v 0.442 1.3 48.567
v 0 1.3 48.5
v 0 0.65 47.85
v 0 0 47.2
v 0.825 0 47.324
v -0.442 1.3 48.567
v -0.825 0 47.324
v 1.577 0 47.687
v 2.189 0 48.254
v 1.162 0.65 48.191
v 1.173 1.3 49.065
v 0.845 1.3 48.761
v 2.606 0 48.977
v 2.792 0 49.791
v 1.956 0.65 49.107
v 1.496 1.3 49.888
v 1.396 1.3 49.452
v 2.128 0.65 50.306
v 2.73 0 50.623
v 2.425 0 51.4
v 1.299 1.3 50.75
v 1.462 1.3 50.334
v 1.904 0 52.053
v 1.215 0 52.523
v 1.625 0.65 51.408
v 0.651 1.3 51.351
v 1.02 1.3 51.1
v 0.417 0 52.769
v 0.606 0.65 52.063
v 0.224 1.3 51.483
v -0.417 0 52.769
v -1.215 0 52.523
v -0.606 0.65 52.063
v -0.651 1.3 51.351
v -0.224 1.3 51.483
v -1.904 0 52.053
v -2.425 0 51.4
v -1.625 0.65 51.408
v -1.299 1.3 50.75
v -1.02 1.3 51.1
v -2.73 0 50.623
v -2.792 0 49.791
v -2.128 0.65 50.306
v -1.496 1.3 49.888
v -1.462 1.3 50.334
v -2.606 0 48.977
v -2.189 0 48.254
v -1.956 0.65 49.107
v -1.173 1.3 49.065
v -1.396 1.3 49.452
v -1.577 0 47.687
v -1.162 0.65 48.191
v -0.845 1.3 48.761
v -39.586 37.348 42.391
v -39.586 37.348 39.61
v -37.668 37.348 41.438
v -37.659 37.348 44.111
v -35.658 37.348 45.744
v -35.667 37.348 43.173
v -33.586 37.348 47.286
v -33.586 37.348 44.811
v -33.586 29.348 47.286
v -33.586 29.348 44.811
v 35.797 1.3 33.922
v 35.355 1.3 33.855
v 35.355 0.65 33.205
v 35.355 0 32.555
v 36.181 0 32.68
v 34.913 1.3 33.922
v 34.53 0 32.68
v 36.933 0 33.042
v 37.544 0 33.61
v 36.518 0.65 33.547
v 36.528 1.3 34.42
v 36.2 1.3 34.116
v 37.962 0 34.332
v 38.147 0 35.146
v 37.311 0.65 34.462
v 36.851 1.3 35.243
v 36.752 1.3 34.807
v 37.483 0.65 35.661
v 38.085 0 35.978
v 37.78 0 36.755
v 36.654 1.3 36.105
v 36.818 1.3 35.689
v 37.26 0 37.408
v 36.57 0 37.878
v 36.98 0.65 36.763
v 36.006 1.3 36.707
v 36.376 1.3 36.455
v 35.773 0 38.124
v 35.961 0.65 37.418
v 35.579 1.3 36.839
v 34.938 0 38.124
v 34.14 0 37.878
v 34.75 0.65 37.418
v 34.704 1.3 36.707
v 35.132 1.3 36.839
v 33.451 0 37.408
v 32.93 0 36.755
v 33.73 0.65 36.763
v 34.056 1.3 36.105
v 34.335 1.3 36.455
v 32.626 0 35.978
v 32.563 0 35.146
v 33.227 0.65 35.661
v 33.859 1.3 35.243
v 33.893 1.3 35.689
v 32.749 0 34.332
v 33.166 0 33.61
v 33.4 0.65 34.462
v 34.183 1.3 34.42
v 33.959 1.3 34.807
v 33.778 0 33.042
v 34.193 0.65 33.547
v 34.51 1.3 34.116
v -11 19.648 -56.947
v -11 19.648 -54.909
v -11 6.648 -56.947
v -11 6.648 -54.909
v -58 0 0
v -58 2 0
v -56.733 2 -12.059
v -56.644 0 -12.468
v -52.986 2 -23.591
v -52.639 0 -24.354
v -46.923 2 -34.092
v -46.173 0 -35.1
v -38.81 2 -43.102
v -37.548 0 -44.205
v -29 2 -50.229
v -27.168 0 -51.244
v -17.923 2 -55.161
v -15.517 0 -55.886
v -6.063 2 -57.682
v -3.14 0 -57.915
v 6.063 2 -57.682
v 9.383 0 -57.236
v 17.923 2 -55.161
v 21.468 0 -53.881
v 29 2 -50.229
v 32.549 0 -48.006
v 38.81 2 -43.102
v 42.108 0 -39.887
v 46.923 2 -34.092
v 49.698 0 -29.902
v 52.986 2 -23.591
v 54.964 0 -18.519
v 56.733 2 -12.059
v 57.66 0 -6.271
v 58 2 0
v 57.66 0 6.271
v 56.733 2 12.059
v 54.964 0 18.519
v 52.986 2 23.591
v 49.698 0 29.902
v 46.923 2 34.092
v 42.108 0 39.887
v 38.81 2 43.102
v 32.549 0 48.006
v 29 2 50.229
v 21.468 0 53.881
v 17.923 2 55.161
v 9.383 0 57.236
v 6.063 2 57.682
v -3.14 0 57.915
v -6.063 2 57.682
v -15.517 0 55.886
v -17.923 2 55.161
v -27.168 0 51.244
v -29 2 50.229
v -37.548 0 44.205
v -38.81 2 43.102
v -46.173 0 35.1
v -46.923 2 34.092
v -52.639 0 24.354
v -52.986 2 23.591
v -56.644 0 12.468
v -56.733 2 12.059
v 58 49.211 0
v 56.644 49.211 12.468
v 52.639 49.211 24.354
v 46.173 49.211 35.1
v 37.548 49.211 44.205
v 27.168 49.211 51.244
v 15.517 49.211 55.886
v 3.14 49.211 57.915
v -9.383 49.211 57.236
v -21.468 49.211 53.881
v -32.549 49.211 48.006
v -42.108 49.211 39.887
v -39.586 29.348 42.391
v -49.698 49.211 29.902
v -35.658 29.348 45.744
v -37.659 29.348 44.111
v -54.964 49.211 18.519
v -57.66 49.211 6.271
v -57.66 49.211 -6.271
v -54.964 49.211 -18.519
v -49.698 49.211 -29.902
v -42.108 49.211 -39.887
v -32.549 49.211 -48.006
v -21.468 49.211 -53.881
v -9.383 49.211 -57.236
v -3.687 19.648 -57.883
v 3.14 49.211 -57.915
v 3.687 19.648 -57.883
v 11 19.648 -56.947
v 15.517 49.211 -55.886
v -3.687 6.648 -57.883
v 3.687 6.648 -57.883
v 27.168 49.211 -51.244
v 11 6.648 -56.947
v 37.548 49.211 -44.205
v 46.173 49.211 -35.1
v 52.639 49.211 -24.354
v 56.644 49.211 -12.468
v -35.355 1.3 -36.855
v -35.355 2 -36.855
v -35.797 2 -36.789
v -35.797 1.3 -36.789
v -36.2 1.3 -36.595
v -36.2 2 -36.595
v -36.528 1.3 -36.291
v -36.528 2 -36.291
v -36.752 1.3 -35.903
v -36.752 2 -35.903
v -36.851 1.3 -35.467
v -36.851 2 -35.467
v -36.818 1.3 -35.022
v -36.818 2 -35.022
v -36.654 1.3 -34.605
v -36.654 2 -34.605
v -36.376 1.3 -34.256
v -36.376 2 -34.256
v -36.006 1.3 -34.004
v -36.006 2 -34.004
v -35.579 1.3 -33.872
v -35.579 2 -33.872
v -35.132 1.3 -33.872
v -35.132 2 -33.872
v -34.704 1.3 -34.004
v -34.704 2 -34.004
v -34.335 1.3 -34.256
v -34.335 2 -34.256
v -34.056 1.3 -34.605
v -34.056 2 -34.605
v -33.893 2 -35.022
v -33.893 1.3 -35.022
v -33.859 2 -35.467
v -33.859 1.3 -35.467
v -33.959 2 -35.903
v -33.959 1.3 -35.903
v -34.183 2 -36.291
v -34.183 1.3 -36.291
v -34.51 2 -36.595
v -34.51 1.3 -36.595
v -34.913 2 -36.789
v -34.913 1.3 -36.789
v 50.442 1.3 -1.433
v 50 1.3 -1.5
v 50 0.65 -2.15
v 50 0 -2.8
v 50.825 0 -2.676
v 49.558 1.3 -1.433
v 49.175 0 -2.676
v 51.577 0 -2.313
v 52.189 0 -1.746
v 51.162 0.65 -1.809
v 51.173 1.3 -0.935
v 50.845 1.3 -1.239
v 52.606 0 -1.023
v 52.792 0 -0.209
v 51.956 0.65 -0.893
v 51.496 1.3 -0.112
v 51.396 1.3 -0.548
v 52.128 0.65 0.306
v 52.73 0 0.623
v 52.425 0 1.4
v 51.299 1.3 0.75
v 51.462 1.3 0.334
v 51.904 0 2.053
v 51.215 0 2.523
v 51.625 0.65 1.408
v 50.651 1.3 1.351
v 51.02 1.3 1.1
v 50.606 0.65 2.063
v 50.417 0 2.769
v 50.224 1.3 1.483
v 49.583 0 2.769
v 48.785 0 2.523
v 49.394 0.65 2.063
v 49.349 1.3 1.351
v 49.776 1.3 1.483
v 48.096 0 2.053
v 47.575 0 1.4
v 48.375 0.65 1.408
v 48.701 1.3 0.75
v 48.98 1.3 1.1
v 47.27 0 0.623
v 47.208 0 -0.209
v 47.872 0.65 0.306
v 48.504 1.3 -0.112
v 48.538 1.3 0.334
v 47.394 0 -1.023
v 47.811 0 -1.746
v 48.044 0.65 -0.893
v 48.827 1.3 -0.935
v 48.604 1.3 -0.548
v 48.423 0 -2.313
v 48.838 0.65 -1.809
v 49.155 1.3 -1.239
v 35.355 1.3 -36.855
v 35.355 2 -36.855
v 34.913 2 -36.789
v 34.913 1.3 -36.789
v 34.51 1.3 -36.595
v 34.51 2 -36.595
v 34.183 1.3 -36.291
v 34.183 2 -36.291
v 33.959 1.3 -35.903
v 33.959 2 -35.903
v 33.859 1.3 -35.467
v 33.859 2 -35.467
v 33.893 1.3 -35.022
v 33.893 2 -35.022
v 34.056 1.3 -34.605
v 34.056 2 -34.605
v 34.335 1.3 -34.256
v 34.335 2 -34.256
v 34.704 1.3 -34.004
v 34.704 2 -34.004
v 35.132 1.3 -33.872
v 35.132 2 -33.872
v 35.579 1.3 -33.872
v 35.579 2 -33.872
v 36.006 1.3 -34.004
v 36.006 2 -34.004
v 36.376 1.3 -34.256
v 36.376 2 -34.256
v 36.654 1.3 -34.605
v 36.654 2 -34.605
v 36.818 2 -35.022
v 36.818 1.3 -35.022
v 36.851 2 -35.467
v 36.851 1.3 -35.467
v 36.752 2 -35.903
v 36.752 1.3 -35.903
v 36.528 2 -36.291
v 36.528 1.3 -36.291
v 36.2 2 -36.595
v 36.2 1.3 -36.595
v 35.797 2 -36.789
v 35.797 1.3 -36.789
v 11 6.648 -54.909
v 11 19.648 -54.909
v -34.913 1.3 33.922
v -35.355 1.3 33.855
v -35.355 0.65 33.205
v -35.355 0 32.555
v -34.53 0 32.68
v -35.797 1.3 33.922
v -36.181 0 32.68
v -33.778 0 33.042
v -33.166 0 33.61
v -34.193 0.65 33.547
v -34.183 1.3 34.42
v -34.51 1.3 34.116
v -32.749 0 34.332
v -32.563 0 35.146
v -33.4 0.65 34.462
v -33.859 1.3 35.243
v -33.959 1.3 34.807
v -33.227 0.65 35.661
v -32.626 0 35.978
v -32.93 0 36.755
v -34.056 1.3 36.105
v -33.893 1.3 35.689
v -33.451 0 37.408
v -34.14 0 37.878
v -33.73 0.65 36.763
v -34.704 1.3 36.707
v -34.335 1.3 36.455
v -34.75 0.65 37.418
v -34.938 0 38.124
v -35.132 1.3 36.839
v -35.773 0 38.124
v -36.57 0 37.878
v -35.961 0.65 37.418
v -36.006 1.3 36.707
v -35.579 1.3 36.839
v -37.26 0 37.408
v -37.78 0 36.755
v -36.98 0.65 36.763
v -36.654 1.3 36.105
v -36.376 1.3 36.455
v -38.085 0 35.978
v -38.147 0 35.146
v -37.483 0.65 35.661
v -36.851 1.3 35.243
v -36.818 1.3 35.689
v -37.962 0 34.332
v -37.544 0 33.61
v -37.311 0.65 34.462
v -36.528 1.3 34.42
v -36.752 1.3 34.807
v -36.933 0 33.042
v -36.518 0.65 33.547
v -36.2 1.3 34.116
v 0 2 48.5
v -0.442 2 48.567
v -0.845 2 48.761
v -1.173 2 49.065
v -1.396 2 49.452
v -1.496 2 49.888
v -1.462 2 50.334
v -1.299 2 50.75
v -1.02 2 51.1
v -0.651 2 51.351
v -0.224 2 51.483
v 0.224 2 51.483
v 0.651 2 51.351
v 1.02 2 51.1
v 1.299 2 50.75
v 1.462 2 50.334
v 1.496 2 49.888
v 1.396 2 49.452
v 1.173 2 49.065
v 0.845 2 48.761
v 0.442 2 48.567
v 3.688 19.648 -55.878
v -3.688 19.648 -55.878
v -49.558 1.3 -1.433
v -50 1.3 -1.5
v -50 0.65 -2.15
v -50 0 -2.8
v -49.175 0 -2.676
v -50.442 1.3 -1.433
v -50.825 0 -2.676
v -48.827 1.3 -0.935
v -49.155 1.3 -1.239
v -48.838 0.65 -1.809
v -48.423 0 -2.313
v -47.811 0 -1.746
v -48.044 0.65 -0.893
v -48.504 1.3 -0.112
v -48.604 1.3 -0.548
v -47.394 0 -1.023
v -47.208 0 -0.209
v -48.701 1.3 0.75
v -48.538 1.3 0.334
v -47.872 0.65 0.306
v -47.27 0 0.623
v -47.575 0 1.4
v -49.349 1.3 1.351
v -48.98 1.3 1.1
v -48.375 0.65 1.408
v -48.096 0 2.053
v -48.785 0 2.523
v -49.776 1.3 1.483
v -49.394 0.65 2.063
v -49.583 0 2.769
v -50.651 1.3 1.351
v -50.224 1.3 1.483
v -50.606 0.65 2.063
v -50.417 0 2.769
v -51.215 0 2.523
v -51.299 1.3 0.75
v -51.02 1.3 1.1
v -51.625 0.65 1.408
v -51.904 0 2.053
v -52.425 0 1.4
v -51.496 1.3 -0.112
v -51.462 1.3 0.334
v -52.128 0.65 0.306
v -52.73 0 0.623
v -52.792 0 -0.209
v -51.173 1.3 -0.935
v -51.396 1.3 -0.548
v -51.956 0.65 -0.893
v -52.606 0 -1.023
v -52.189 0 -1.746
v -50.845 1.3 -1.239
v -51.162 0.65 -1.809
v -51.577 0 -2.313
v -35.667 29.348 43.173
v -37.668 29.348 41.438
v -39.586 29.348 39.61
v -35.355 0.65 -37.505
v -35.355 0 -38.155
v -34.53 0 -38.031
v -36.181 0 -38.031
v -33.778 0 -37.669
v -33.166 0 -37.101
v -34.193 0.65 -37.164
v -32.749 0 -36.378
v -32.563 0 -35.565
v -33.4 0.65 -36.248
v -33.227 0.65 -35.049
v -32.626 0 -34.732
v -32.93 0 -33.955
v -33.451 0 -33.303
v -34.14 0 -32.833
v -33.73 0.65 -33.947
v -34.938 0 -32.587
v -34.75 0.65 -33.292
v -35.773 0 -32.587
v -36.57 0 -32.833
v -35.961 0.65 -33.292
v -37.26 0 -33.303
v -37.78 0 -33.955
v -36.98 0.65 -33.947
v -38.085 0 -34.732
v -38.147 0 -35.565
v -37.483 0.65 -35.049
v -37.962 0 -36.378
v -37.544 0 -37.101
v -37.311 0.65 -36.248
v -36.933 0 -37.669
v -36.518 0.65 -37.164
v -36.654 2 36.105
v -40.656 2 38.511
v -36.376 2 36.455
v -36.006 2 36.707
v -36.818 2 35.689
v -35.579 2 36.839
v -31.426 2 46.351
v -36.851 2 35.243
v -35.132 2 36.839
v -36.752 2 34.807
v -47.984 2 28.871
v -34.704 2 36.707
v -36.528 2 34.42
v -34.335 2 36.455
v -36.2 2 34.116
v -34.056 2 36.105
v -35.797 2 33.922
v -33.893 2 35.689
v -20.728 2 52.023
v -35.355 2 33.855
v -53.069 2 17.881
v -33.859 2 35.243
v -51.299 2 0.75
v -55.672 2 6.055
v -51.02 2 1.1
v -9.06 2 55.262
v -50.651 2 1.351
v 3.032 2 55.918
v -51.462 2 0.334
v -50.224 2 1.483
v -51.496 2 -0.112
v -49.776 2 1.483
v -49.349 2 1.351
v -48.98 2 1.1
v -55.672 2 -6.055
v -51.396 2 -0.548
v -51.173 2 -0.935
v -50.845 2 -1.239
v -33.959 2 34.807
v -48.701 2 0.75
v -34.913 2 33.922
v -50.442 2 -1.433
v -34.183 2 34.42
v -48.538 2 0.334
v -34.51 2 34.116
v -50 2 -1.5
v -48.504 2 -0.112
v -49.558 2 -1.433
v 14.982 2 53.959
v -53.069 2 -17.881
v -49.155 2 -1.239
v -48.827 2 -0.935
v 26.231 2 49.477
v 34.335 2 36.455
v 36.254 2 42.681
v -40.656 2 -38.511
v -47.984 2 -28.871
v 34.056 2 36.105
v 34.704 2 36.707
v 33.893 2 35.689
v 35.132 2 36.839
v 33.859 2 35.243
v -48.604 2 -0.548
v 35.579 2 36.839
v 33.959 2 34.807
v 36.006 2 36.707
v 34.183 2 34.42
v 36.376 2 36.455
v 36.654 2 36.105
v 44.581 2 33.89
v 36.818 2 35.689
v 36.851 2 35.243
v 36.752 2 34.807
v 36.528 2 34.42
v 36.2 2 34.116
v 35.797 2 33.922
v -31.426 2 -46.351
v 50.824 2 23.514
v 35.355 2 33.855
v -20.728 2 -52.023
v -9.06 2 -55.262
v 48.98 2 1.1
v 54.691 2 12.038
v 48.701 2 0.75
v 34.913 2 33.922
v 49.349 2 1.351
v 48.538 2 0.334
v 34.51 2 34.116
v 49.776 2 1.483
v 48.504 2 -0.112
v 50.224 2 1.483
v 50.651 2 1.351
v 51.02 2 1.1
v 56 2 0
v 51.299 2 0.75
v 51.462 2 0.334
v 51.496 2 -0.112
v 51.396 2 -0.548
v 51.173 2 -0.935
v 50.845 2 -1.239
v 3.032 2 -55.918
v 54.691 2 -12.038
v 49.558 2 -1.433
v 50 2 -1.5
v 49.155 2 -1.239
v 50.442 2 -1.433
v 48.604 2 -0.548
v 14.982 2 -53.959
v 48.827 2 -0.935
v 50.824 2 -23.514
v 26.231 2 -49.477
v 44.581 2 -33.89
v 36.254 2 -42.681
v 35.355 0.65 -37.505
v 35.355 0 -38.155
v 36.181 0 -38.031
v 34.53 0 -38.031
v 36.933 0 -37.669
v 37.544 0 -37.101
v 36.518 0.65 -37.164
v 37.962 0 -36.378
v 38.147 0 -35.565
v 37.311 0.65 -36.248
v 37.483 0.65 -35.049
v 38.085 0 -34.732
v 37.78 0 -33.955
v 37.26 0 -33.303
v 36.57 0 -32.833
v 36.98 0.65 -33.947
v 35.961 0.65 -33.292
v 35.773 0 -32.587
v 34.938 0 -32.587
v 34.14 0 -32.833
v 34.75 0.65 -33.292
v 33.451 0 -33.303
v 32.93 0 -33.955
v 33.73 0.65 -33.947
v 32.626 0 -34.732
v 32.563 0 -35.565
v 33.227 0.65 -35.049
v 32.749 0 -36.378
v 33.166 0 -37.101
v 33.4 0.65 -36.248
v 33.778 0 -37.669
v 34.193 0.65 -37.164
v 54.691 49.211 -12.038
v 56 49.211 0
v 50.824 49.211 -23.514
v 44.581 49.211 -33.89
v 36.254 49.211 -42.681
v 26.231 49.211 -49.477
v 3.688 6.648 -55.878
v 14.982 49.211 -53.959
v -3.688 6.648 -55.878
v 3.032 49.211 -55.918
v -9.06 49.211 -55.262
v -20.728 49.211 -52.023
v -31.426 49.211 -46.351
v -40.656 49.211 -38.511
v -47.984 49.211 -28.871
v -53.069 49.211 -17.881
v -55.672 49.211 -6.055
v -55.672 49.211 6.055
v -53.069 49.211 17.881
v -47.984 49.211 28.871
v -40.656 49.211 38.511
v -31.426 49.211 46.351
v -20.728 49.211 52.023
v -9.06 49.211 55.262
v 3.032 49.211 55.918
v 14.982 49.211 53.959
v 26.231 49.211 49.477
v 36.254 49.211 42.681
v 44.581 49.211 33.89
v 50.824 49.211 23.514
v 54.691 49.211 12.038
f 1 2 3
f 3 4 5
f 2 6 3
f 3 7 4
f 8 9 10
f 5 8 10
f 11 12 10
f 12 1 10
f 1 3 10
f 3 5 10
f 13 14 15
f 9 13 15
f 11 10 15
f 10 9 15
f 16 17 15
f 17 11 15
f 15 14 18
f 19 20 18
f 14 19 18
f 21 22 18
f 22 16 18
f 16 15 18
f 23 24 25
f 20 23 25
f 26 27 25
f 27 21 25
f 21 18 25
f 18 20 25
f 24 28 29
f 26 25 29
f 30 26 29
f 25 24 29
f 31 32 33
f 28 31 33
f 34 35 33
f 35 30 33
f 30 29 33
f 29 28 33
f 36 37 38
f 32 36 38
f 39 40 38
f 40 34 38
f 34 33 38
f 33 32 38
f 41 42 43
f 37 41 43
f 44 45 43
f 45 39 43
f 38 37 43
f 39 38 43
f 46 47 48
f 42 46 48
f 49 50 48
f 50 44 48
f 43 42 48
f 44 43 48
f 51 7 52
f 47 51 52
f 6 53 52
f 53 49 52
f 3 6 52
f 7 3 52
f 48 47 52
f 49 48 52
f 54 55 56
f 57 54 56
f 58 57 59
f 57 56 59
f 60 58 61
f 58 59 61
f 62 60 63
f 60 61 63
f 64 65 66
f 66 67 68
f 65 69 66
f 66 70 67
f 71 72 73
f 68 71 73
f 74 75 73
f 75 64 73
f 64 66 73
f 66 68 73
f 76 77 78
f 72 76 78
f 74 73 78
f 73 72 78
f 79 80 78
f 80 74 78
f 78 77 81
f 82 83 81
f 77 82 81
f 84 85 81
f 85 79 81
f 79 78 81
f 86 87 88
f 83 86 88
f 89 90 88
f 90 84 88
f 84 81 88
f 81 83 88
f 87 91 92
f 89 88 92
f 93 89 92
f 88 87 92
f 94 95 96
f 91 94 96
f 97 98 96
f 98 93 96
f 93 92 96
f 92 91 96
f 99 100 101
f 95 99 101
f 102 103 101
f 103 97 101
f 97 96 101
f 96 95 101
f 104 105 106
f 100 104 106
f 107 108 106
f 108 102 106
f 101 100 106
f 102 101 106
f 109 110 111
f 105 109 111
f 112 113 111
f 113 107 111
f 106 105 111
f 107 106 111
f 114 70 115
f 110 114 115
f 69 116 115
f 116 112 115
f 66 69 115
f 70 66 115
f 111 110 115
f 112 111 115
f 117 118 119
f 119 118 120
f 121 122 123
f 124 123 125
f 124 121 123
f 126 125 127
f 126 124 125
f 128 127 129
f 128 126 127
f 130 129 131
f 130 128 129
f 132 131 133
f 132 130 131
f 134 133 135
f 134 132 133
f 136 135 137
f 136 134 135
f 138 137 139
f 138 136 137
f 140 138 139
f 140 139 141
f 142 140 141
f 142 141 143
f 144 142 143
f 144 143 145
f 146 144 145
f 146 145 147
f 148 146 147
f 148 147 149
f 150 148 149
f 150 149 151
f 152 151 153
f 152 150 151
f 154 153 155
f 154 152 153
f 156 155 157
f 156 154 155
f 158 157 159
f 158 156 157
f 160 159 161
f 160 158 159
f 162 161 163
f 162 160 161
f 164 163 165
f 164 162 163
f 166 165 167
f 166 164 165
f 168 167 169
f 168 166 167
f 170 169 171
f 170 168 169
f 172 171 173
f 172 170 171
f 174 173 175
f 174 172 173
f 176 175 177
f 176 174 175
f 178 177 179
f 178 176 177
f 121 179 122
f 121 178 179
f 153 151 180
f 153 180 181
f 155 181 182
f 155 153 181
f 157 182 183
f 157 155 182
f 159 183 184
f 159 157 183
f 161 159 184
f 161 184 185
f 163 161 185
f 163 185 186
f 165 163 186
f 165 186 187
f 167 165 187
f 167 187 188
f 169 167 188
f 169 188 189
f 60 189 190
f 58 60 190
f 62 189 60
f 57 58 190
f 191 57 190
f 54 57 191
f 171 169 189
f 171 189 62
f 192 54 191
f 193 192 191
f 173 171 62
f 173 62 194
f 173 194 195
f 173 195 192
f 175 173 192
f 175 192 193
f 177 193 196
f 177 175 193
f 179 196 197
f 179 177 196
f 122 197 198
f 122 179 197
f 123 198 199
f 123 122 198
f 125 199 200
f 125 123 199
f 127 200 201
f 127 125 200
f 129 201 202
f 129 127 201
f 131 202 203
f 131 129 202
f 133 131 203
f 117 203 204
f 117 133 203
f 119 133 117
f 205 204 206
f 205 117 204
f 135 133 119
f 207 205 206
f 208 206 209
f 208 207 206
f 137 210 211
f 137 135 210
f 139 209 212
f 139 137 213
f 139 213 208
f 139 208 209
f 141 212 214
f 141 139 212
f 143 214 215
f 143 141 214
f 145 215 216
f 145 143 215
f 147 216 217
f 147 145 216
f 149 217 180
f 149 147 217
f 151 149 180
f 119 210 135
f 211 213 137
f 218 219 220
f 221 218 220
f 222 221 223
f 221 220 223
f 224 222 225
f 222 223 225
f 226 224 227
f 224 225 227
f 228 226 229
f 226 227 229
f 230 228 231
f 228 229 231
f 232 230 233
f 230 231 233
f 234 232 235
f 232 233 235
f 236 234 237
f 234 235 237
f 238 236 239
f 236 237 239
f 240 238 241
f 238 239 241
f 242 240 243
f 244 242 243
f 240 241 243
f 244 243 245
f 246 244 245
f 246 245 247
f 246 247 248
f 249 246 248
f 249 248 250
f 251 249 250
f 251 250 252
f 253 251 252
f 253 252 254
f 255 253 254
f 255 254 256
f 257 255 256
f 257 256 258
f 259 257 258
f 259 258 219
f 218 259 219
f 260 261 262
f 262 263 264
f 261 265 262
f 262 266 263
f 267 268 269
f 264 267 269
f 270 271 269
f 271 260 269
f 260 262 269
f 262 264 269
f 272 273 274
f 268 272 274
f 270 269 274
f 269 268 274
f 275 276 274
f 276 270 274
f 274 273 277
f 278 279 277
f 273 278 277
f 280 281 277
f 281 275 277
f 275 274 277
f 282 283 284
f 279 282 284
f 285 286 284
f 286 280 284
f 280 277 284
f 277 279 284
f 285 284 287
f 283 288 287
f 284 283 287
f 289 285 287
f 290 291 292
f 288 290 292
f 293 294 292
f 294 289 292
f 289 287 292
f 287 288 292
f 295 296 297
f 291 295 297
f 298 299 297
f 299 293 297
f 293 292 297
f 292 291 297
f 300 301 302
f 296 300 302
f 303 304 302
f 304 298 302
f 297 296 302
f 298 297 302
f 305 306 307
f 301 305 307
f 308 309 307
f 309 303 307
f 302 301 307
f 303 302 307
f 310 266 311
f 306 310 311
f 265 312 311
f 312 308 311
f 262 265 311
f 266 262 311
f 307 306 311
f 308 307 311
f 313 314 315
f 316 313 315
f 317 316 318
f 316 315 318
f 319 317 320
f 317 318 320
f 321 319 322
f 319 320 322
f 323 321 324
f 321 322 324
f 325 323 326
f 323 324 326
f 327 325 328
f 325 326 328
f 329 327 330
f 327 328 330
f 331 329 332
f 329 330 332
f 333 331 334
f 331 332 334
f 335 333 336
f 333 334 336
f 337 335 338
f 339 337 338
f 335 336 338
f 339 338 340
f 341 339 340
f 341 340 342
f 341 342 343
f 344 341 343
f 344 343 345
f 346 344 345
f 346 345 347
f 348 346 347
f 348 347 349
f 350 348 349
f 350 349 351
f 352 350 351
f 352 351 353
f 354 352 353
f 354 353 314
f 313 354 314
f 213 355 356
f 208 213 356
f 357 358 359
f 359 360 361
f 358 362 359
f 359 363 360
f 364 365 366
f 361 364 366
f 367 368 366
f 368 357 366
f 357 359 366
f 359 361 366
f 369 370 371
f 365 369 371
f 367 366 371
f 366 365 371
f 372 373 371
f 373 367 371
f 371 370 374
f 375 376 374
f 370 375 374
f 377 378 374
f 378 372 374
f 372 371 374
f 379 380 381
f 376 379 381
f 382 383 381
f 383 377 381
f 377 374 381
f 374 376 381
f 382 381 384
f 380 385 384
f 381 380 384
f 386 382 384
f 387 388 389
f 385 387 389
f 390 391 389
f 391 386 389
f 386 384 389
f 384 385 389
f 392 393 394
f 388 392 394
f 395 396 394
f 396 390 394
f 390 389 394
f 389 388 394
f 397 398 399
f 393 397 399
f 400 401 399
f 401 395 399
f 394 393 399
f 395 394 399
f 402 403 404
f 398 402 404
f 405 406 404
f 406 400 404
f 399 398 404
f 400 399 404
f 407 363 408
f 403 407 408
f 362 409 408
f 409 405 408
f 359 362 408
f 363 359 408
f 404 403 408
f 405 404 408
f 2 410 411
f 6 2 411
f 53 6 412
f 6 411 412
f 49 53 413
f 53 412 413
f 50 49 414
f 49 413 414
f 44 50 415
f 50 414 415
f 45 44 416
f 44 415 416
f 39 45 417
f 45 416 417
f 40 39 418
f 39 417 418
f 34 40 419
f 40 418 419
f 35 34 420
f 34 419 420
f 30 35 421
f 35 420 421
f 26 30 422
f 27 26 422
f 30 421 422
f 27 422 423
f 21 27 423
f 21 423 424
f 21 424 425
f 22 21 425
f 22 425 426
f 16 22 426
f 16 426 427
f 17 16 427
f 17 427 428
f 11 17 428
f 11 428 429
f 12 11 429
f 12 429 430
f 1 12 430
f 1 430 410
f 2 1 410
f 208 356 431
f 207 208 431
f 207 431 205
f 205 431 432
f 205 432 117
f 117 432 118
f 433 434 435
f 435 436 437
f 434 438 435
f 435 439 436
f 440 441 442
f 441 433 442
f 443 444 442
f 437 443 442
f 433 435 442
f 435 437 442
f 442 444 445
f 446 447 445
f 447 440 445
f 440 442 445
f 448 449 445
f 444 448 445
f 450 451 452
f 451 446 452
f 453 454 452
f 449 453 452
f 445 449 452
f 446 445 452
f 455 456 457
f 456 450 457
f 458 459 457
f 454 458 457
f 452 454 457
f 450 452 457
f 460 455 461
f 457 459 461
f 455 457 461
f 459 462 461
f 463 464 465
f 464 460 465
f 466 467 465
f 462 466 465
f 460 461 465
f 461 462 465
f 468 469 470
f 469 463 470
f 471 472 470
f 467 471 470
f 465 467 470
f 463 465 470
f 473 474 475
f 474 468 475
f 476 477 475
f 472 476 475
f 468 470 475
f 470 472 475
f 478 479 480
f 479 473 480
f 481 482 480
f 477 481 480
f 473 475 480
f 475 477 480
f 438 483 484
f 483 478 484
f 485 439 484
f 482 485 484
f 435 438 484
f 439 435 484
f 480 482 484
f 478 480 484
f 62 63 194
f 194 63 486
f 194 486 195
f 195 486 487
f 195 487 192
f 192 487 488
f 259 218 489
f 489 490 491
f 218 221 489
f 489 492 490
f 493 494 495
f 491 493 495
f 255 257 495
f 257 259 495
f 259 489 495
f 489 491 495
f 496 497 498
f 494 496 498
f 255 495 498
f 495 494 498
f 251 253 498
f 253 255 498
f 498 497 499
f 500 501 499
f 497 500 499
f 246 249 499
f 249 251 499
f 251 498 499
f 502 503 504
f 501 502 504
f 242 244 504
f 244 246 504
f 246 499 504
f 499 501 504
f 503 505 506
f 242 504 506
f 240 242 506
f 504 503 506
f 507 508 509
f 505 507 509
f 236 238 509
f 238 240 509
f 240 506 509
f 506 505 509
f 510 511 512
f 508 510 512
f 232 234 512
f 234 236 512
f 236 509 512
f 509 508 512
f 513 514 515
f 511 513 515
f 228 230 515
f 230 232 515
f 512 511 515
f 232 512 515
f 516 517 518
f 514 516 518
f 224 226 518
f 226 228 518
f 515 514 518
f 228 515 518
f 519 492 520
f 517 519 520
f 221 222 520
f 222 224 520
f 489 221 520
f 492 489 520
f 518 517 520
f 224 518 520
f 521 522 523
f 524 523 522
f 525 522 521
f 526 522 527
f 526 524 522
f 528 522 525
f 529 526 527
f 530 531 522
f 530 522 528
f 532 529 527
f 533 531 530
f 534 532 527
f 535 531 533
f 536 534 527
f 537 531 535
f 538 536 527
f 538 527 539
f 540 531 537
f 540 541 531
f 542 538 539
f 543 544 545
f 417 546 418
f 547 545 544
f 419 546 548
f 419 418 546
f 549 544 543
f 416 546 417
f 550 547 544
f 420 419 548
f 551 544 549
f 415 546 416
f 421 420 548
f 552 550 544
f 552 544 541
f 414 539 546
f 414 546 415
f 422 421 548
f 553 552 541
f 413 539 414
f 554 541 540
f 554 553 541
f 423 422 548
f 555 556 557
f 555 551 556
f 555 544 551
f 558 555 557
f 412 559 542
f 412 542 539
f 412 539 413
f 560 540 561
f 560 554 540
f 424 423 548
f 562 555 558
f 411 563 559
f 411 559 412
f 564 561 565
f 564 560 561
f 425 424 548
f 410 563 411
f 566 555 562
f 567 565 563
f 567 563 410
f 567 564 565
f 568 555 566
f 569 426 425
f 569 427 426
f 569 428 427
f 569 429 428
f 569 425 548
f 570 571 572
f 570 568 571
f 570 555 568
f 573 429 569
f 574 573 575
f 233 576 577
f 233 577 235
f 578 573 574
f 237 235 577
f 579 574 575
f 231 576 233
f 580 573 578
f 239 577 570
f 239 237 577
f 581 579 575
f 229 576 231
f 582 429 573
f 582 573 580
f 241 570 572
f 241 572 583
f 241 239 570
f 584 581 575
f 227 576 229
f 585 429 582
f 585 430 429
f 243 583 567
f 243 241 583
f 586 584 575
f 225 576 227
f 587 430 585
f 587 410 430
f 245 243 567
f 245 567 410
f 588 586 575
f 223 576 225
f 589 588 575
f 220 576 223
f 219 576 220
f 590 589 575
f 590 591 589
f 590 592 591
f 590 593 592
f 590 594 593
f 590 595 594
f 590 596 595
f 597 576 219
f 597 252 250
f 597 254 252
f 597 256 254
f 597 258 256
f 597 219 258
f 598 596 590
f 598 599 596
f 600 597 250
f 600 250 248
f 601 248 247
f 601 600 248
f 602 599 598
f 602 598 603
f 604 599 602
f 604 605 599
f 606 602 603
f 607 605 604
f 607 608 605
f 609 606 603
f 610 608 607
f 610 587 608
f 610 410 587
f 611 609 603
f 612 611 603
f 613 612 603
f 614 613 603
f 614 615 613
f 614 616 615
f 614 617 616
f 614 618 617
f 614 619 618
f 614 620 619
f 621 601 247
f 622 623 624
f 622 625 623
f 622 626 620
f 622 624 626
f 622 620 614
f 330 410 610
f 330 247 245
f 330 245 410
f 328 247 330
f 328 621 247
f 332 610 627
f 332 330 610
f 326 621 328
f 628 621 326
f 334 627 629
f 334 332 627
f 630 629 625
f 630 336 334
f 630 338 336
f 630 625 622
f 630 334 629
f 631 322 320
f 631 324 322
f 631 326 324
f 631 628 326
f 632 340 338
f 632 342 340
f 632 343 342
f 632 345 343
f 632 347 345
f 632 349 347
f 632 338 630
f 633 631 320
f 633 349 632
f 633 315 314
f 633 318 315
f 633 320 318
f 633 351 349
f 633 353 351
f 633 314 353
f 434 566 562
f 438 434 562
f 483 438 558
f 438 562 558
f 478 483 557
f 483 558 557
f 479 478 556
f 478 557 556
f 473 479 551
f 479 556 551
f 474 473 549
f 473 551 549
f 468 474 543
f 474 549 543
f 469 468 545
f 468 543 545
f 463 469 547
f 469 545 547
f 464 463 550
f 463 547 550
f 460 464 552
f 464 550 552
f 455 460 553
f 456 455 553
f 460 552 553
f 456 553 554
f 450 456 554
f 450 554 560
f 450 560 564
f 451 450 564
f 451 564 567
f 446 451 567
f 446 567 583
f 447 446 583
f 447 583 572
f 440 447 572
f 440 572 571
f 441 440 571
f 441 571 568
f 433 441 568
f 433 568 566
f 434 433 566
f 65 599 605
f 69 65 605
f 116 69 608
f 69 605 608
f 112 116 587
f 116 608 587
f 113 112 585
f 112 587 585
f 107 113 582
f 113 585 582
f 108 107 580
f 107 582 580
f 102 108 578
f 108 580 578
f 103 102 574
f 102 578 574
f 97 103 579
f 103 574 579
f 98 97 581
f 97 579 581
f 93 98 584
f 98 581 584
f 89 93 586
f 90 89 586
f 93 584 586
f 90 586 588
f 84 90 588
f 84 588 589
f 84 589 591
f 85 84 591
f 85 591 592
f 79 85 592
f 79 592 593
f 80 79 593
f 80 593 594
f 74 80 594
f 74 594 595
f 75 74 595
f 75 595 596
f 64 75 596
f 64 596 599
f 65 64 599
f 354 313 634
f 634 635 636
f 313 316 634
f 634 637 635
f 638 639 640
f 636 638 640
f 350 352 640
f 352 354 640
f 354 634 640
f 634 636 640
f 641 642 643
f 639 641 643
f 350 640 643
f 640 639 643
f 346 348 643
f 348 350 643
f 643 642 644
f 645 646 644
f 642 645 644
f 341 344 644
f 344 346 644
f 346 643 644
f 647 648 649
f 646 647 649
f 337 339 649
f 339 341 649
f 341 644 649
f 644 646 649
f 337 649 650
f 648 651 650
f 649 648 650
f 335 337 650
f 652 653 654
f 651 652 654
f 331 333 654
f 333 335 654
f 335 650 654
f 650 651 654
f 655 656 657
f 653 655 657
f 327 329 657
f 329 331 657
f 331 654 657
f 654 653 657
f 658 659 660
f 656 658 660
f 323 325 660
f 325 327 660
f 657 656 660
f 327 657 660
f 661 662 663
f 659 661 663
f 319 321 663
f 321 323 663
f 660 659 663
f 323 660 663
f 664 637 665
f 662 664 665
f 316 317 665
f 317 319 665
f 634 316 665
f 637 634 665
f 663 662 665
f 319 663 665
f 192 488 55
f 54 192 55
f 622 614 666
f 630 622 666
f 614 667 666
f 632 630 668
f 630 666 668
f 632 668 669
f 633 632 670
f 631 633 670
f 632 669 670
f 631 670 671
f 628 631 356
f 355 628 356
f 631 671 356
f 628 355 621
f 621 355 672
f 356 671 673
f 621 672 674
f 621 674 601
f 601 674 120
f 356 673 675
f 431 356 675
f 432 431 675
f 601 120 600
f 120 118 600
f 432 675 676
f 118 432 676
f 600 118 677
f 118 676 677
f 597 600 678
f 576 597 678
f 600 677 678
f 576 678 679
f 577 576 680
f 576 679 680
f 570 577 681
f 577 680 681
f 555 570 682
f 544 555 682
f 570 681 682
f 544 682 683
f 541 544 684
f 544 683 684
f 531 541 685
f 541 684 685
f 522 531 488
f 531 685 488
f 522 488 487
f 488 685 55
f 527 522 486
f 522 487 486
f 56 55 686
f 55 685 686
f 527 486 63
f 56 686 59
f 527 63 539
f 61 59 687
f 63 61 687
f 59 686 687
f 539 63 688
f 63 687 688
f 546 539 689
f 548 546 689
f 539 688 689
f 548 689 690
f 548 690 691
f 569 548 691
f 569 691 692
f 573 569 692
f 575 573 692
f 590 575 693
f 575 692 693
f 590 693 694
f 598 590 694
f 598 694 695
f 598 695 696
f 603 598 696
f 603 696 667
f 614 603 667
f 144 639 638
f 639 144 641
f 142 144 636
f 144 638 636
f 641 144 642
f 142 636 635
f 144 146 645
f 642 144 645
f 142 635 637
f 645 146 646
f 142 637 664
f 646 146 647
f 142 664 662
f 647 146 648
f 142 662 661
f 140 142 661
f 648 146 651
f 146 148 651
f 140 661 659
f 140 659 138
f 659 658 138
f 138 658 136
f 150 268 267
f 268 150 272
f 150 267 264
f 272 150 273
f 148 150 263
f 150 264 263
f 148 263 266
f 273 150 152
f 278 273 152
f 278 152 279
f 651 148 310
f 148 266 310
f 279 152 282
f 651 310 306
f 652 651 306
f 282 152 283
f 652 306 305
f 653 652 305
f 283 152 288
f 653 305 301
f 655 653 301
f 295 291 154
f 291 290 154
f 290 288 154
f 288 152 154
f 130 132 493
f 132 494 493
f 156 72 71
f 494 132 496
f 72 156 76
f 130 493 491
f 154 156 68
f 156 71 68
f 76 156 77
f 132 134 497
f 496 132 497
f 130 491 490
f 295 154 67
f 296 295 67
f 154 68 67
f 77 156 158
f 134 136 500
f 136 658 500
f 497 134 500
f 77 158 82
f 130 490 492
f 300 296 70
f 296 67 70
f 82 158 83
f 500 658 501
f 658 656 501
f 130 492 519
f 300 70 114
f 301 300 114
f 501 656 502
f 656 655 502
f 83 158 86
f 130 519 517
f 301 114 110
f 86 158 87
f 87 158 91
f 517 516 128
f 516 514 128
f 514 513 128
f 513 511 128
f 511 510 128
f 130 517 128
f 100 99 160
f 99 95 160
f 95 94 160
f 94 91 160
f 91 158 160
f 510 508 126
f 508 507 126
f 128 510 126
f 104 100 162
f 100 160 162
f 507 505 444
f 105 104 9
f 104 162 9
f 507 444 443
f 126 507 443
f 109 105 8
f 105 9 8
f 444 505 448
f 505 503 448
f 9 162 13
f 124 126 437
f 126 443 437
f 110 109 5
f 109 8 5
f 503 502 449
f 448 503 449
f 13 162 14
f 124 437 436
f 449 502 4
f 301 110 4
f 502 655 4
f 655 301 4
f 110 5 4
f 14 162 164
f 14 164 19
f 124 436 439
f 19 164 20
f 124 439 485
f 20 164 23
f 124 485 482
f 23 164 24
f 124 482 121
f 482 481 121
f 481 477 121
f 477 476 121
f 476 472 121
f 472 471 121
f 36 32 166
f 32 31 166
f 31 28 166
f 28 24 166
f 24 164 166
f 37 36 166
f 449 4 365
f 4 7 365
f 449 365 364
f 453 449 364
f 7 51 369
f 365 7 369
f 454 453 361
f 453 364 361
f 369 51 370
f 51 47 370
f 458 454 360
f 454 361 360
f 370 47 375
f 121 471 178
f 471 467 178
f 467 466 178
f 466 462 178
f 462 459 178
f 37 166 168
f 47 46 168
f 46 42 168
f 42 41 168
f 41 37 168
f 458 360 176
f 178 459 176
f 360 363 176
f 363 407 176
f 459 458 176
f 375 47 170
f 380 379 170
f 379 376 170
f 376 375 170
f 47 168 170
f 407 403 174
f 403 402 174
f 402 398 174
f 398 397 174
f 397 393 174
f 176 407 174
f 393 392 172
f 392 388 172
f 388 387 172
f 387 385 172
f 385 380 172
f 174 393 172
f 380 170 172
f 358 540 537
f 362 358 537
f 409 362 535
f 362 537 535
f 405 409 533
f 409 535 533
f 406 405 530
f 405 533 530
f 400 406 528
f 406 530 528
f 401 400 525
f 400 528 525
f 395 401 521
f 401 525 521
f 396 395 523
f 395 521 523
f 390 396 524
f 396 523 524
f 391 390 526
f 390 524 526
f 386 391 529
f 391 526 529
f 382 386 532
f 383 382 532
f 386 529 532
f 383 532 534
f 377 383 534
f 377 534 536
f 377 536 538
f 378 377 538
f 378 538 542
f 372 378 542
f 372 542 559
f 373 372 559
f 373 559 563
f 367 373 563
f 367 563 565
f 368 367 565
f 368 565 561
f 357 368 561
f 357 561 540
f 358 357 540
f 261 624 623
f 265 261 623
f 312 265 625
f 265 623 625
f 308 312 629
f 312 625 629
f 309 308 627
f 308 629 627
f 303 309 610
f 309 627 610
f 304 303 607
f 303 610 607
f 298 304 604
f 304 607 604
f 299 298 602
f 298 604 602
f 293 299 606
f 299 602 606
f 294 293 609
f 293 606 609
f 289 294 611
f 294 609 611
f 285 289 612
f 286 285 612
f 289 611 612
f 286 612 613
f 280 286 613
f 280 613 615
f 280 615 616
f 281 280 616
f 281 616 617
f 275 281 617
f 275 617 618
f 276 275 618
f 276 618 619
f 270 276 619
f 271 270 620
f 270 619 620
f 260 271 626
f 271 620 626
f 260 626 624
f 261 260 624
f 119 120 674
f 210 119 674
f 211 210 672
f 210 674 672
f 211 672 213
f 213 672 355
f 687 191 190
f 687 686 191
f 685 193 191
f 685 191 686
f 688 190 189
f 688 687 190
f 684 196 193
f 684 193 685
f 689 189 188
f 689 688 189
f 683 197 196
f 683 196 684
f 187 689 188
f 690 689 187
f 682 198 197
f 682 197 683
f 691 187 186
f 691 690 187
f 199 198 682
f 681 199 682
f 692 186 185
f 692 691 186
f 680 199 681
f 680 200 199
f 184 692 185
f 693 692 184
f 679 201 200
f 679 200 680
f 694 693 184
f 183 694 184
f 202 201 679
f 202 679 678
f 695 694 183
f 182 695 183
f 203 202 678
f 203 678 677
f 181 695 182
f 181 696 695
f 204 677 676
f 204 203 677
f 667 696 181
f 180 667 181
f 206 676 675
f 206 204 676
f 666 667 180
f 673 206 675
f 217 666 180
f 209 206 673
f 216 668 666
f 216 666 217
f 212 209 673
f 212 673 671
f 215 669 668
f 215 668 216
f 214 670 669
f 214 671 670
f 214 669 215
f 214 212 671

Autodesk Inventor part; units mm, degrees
ref_plane "YZ Plane" through (0, 0, 0) normal (1, 0, 0) x (0, 1, 0)
sketch "Эскиз1" plane through (0, 0, 0) normal (0, 1, 0) x (-1, 0, 0)
  circle A0 centre (0, 0) radius 58
  line L0 (79.4555, 0) -> (-79.4555, 0)
  line L1 (0, -106.6382) -> (0, 90.6575)
  dimension "d0" = 116
extrude "Выдавливание1" add sketch "Эскиз1" along normal blind 2
sketch "Эскиз2" plane through (0, 0, 0) normal (0, -1, 0) x (1, 0, 0)
  circle A0 centre (0, 0) radius 57
  line L0 (0, -103.8803) -> (0, 88.3129)
  line L1 (-79.4555, 0) -> (79.4555, 0) projected
  circle A1 centre (0, 0) radius 50
  circle A2 centre (0, -50) radius 1.5
  circle A3 centre (50, 0) radius 1.5
  circle A4 centre (0, 50) radius 1.5
  circle A5 centre (-50, 0) radius 1.5
  circle A6 centre (35.3553, -35.3553) radius 1.5
  circle A7 centre (50, 0) radius 1.5
  circle A8 centre (35.3553, 35.3553) radius 1.5
  circle A9 centre (0, 50) radius 1.5
  circle A10 centre (-35.3553, 35.3553) radius 1.5
  circle A11 centre (-50, 0) radius 1.5
  circle A12 centre (-35.3553, -35.3553) radius 1.5
  dimension "d22" = 3
  dimension "d23" = 3
  dimension "d26" = 3
  dimension "d30" = 360
  dimension "d84" = 114
sketch "Эскиз6" plane through (0, 2, 0) normal (0, 1, 0) x (1, 0, 0)
  circle A0 centre (0, 0) radius 58 projected
  dimension "d85" = 116
ref_plane "РабПлоскость2" through (0, 49.211, 0) normal (0, 1, 0) x (1, 0, 0)
sketch "Эскиз7" plane through (0, 49.211, 0) normal (0, 1, 0) x (1, 0, 0)
  circle A0 centre (0, 0) radius 58 projected
  dimension "d86" = 116
loft "Лофт1" add profiles "Эскиз7", "Эскиз6"
sketch "Эскиз8" plane through (0, 49.211, 0) normal (0, 1, 0) x (1, 0, 0)
  circle A0 centre (0, 0) radius 56
  dimension "d83" = 112
extrude "Выдавливание9" cut sketch "Эскиз8" against normal blind 47.211
ref_plane "РабПлоскость6" through (-79.4555, 0, 0) normal (0, 0, -1) x (1, 0, 0)
sketch "Эскиз10" plane through (-79.4555, 0, 0) normal (0, 0, -1) x (1, 0, 0)
  line L0 (137.4555, -49.211) -> (21.4555, -49.211) projected
  line L1 (79.4555, 0) -> (79.4555, -49.211)
  line L2 (68.4555, -6.6479) -> (90.4555, -6.6479)
  line L3 (90.4555, -6.6479) -> (90.4555, -19.6479)
  line L4 (90.4555, -19.6479) -> (68.4555, -19.6479)
  line L5 (68.4555, -19.6479) -> (68.4555, -6.6479)
  line L6 (60.4965, -15.4479) -> (98.4145, -15.4479)
  line L7 (98.4145, -15.4479) -> (98.4145, -23.8479)
  line L8 (98.4145, -23.8479) -> (60.4965, -23.8479)
  line L9 (60.4965, -23.8479) -> (60.4965, -15.4479)
  circle A0 centre (60.4965, -15.4479) radius 1.15
  circle A1 centre (98.4145, -15.4479) radius 1.15
  line L10 (45.8699, -29.3481) -> (39.8699, -29.3481)
  line L11 (39.8699, -29.3481) -> (39.8699, -37.3481)
  line L12 (39.8699, -37.3481) -> (45.8699, -37.3481)
  line L13 (45.8699, -37.3481) -> (45.8699, -29.3481)
  point P0 (79.4555, 0)
  dimension "d94" = 22
  dimension "d95" = 13
  dimension "d101" = 37.918
  dimension "d102" = 8.4
  dimension "d103" = 2.3
  dimension "d104" = 2.3
  dimension "d114" = 6
  dimension "d115" = 8
extrude "Выдавливание11" cut sketch "Эскиз10" along normal blind 60 contours L2 L3 L6 L1 | L1 L6 L5 L2 | L6 L3 L4 L1 | L1 L4 L5 L6
hole "Отверстие1" at (0, 0, 50) at (-35.3553, 0, 35.3553) at (35.3553, 0, 35.3553) at (50, 0, 0) at (35.3553, 0, -35.3553) at (-35.3553, 0, -35.3553) at (-50, 0, 0) direction (0, 1, 0) diameter 3 end through all countersink diameter 5.6 countersink angle 90
extrude "Выдавливание13" cut sketch "Эскиз10" against normal blind 60 contours L13 L12 L11 L10
properties part number "caseTop" material "Пластик АБС"
